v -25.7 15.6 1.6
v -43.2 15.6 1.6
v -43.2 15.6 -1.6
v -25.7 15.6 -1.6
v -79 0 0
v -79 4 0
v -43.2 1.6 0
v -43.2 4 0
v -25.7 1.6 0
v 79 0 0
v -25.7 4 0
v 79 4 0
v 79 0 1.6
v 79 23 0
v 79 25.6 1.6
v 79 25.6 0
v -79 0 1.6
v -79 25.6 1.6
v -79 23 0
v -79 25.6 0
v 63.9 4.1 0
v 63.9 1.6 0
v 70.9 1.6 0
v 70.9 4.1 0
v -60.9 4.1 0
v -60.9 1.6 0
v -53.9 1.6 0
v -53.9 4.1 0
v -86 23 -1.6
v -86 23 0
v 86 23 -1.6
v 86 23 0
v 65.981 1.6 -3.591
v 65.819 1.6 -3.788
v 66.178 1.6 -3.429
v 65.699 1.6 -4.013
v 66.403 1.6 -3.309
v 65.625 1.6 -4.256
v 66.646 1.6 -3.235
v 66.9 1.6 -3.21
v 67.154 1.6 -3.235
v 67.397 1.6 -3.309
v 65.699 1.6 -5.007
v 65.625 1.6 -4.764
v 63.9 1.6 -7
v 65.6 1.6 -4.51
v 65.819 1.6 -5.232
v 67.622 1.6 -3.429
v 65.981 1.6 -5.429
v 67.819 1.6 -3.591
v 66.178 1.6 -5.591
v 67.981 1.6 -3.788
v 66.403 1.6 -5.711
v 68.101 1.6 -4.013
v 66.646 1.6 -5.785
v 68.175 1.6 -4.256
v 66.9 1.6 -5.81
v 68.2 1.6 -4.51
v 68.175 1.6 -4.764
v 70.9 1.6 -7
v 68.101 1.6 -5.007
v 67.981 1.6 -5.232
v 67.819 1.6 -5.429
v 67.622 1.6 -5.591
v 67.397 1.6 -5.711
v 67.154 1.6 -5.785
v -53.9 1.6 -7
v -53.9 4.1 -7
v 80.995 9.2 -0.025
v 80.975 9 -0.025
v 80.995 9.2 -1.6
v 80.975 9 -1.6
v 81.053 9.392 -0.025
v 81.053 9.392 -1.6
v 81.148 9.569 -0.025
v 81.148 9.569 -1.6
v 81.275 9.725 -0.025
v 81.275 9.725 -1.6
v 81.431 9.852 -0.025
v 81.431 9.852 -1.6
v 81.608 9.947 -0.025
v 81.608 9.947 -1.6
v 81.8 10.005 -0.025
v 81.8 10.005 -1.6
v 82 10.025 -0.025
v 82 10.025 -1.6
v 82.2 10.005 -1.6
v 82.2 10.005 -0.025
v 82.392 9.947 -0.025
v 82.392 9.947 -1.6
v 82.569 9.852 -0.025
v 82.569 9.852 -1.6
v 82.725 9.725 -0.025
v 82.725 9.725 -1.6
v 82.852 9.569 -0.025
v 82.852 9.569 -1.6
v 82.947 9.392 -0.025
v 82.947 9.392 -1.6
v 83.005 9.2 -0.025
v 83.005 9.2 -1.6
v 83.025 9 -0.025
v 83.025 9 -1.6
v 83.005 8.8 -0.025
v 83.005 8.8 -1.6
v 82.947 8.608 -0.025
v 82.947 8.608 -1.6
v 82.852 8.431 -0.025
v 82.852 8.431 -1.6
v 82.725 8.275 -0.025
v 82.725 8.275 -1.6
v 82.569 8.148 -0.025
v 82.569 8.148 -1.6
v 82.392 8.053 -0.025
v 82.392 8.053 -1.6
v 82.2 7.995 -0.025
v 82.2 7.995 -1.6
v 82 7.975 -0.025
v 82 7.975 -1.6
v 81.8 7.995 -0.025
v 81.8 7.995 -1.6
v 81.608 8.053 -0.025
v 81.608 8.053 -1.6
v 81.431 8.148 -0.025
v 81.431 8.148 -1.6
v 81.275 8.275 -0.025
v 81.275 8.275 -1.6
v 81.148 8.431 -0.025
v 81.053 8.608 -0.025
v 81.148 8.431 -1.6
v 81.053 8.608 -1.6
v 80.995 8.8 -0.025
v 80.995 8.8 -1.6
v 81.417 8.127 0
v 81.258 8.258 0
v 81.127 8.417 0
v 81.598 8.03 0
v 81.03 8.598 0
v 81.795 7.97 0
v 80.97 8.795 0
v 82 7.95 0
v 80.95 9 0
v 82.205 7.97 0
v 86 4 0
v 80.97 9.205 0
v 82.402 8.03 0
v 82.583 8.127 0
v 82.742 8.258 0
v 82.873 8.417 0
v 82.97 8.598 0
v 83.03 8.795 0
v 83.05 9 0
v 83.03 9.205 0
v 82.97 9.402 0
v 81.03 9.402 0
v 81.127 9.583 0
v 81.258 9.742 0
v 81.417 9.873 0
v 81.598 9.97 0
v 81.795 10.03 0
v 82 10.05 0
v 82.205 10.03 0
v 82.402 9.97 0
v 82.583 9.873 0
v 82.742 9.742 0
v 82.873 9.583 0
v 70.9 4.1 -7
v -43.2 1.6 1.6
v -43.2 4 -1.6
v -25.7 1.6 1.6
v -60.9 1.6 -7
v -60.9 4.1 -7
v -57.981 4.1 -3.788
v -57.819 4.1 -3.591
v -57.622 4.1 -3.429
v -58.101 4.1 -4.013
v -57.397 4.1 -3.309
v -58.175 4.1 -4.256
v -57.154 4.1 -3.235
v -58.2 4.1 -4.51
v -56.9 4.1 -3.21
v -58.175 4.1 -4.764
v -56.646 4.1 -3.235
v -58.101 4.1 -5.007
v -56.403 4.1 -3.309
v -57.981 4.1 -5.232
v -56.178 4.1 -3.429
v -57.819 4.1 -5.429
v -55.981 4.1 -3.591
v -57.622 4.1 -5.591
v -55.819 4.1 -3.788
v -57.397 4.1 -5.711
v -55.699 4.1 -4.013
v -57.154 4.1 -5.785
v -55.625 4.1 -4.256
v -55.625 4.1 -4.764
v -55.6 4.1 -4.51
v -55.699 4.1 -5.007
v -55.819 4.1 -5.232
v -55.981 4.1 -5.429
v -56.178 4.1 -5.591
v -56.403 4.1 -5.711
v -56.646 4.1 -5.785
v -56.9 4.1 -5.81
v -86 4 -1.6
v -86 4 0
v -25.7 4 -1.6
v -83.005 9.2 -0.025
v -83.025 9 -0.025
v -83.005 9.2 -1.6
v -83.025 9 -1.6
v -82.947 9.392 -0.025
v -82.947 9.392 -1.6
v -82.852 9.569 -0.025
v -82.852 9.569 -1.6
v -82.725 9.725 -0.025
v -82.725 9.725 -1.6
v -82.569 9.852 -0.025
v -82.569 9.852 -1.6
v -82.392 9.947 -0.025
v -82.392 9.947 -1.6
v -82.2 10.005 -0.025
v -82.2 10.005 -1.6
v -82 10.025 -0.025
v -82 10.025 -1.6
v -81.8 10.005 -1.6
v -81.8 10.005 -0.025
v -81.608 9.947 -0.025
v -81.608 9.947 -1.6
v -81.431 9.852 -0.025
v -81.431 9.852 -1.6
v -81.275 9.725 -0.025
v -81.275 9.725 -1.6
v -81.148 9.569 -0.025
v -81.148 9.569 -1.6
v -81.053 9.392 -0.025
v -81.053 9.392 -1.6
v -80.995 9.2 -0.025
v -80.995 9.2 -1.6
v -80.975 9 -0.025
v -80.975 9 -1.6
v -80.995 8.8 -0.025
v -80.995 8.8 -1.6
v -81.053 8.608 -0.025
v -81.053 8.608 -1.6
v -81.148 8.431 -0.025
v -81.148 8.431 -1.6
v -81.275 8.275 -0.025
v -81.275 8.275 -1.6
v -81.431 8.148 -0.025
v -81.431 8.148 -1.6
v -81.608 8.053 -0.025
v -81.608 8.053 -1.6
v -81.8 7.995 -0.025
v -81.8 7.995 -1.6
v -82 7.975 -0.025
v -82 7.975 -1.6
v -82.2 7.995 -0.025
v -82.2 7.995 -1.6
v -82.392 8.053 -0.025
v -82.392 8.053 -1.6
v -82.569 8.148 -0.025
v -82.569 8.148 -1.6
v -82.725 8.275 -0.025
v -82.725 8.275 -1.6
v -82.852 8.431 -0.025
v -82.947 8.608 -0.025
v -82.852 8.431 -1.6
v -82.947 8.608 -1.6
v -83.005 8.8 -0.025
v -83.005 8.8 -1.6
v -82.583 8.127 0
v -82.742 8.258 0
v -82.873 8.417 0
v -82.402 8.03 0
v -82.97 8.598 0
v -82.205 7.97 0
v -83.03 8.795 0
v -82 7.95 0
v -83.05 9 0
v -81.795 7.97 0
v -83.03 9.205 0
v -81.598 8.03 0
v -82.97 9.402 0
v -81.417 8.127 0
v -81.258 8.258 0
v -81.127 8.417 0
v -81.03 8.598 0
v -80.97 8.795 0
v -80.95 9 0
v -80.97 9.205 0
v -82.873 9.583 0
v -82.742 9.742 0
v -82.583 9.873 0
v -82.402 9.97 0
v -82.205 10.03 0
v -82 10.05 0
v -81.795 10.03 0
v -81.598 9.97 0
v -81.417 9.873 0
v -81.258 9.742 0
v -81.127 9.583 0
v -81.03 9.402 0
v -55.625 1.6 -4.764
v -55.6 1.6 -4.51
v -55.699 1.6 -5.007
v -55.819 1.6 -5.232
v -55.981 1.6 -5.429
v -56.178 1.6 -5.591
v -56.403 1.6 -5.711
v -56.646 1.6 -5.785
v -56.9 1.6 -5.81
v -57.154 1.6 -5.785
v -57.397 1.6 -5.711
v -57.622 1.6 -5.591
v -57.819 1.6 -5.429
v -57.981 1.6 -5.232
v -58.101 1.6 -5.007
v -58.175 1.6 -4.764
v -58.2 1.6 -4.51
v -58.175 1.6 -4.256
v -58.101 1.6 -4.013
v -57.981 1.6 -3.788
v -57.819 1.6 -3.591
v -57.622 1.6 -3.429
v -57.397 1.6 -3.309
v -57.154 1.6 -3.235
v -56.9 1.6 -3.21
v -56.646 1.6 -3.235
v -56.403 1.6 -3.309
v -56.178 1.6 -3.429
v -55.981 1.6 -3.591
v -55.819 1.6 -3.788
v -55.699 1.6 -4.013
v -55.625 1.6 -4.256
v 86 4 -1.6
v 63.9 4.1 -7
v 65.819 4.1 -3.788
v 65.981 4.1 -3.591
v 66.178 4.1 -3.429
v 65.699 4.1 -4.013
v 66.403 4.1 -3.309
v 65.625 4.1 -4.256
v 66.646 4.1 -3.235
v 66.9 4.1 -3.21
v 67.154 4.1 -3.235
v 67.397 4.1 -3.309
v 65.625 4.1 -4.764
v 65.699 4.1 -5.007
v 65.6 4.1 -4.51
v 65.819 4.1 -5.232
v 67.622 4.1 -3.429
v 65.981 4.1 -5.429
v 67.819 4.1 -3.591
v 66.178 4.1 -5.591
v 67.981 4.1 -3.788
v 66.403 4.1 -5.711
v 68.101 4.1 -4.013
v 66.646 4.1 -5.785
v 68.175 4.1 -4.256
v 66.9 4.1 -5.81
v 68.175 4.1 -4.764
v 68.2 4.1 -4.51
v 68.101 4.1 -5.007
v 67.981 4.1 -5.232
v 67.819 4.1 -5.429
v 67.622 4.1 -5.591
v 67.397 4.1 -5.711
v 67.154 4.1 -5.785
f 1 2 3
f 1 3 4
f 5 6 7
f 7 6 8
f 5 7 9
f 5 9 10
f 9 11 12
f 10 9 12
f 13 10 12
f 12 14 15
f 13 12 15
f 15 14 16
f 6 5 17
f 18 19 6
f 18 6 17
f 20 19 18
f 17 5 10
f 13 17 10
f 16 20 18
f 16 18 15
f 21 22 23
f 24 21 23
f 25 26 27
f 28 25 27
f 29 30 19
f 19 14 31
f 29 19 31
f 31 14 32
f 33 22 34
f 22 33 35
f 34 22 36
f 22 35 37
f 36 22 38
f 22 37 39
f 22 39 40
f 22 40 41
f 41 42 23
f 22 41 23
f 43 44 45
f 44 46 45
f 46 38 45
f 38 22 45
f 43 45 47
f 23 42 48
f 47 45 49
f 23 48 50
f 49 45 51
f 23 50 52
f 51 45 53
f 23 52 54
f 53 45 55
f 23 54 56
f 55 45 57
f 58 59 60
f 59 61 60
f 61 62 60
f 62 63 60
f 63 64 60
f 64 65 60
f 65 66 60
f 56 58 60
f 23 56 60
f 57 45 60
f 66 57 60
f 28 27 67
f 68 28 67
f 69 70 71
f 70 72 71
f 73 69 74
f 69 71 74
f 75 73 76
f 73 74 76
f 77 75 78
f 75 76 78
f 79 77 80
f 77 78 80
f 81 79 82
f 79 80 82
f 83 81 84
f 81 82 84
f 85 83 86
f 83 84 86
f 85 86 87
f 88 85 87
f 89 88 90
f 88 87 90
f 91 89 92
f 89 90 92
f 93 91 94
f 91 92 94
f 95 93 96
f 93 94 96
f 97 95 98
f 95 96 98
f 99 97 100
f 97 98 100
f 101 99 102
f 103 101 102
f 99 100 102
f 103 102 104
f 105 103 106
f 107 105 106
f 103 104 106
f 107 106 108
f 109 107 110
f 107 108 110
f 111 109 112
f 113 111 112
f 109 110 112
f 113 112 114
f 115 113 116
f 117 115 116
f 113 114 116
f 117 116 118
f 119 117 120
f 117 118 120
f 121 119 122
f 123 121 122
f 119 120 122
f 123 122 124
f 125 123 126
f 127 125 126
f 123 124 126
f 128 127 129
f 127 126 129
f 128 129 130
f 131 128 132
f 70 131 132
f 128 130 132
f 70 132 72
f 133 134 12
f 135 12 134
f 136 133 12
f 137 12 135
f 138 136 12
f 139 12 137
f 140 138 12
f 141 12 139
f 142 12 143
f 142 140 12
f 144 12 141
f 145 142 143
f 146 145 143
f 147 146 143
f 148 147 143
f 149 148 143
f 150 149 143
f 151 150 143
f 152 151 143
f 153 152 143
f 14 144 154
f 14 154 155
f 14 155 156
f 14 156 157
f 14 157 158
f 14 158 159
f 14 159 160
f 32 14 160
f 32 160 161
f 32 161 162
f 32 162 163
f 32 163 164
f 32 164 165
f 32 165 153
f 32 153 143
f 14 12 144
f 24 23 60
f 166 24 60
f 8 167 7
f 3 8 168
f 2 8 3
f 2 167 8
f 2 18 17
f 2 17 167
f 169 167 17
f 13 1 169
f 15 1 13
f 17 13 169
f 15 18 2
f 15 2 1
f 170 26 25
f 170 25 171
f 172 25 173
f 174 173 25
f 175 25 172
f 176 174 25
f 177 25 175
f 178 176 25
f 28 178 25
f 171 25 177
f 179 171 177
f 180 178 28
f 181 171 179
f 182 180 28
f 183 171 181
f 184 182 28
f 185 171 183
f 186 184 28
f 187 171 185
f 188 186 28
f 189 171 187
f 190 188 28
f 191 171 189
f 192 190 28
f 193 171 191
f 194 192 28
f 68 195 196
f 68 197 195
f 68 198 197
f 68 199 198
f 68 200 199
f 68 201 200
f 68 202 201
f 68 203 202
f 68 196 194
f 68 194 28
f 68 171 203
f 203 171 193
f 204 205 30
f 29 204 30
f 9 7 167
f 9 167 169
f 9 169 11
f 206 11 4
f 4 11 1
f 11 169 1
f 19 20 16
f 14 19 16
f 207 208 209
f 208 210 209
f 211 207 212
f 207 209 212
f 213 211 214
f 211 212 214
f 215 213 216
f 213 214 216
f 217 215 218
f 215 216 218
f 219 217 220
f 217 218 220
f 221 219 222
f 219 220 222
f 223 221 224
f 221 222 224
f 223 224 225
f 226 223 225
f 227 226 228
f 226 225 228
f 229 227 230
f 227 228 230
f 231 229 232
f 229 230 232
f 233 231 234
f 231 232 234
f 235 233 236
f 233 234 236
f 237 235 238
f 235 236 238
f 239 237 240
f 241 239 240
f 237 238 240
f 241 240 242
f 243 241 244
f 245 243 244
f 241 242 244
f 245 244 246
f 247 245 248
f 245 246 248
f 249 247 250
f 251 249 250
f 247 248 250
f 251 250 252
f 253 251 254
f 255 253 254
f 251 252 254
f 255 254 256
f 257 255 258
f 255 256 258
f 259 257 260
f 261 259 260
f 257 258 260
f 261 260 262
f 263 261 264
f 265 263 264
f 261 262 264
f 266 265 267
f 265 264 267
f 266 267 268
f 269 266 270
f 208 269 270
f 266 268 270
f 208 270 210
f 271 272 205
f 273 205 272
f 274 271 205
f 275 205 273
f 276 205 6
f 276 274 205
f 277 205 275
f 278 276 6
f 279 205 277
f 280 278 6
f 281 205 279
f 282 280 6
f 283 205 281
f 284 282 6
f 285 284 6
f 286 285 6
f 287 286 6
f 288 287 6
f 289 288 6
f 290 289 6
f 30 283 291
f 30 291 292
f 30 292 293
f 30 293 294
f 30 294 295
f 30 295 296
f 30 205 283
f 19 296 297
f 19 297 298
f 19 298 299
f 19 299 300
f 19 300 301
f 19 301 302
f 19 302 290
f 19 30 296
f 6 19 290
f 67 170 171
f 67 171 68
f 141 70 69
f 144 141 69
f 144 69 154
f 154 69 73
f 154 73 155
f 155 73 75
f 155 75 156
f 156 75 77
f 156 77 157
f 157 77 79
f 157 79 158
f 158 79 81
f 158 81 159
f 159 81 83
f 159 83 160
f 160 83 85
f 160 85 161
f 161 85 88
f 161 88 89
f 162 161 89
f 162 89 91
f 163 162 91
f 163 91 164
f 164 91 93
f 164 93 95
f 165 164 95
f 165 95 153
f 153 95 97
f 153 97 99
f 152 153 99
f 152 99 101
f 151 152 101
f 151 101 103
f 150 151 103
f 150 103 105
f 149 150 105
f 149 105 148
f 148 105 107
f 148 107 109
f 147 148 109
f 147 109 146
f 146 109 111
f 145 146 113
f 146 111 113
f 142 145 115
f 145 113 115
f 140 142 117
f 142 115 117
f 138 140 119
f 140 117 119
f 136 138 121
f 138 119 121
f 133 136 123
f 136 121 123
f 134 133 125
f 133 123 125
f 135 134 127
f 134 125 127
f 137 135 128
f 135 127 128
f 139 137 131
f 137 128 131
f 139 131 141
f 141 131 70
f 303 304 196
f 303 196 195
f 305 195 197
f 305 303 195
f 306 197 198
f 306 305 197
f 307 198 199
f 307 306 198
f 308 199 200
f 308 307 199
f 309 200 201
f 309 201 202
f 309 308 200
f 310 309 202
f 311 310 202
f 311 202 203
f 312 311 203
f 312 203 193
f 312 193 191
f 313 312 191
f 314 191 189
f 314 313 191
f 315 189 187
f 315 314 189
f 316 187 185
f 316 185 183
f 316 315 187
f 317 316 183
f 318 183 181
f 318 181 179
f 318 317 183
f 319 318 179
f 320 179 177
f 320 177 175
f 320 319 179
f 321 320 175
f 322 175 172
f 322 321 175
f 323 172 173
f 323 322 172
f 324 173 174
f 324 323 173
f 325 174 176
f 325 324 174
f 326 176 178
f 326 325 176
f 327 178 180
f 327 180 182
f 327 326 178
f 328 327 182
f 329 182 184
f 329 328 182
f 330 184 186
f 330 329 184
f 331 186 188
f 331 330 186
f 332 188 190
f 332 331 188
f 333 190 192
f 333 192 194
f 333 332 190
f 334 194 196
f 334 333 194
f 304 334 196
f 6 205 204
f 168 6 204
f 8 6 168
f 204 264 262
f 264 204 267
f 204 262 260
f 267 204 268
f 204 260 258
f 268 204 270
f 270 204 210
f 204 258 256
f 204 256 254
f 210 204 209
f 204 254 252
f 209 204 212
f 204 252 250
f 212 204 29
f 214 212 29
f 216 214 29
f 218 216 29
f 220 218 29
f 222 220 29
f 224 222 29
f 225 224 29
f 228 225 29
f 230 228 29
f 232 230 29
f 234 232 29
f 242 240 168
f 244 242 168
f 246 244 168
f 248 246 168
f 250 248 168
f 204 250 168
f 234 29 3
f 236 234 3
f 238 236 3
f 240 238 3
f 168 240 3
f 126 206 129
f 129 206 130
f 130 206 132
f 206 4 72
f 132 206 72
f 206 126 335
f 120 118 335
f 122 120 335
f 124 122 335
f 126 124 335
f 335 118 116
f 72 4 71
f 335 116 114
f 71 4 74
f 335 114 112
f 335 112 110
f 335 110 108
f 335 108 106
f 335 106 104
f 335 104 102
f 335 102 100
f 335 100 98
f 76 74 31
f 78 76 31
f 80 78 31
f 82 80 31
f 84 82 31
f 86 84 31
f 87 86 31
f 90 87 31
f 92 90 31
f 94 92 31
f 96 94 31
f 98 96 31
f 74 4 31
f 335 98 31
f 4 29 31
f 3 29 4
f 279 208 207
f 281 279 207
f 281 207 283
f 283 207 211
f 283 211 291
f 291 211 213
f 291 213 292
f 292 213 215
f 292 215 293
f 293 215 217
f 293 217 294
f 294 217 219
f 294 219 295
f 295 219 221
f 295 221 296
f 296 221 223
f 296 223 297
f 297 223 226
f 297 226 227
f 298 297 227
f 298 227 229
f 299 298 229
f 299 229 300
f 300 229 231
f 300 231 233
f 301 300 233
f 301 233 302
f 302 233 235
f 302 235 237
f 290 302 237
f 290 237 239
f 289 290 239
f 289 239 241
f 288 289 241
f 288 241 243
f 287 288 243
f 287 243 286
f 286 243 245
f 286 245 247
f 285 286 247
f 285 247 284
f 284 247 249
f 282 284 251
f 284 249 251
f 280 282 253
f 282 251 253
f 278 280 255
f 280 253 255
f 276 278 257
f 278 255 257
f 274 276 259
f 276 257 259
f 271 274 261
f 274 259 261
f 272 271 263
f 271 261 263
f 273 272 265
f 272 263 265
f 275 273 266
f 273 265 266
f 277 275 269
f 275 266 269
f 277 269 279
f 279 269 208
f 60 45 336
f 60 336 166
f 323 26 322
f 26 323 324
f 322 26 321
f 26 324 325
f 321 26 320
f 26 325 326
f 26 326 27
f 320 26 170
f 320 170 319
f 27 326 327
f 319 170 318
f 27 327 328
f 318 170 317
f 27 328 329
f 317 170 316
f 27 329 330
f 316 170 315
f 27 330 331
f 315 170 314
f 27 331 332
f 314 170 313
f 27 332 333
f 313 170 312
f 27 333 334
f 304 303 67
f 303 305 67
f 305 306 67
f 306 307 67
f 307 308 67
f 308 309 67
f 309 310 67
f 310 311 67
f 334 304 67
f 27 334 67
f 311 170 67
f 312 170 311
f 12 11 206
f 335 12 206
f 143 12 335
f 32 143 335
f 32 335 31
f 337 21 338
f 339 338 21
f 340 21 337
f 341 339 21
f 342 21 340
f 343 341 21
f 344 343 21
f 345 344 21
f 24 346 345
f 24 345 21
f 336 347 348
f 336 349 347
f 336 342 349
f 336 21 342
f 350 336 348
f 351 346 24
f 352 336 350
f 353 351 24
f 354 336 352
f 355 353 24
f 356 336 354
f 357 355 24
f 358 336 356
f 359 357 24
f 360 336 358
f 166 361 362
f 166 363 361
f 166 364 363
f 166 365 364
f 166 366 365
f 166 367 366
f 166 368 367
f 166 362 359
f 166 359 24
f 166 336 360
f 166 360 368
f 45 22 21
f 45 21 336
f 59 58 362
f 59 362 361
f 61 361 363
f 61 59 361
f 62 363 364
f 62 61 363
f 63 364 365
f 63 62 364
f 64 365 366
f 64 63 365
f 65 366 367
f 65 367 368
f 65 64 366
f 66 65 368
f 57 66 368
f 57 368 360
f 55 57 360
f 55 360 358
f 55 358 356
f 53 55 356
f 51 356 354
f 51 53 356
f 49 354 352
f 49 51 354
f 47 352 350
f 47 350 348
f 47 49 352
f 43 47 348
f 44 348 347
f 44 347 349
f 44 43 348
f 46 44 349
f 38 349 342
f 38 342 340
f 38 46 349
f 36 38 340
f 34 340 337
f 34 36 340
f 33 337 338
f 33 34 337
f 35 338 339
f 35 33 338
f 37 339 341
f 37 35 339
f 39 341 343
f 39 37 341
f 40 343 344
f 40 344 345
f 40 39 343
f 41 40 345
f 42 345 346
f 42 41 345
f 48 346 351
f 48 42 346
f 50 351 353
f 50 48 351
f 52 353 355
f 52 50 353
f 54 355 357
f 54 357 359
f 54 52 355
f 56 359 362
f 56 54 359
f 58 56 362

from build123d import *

# Parameters (mm, degrees)
SKETCH1_W                                = 158
SKETCH1_H                                = 25.6
BOSS_EXTRUDE1_DEPTH                      = 1.6
SKETCH2_W                                = 172
SKETCH2_H                                = 19
BOSS_EXTRUDE2_DEPTH                      = 1.6
TAP_DRILL_FOR_M2_5X0_45_TAP3_D           = 2.05
TAP_DRILL_FOR_M2_5X0_45_TAP3_CSINK_D     = 2.1
TAP_DRILL_FOR_M2_5X0_45_TAP3_CSINK_ANGLE = 90
SKETCH7_W                                = 7
SKETCH7_H                                = 7
SKETCH7_R                                = 1.3
BOSS_EXTRUDE3_DEPTH                      = 2.5
BOSS_EXTRUDE3_2_DEPTH                    = 2.5
SKETCH8_W                                = 17.5
SKETCH8_H                                = 14
CUT_EXTRUDE1_DEPTH                       = 2.6
CUT_EXTRUDE1_DEPTH_BACK                  = 8


with BuildPart() as part:
    # Sketch1 → Boss-Extrude1 (new body)
    with BuildSketch(Plane.XY):
        with Locations((0, 12.8)):
            Rectangle(SKETCH1_W, SKETCH1_H)
    extrude(amount=BOSS_EXTRUDE1_DEPTH)

    # Sketch2 → Boss-Extrude2 (add)
    with BuildSketch(Plane.XY):
        with Locations((0, 13.5)):
            Rectangle(SKETCH2_W, SKETCH2_H)
    extrude(amount=-BOSS_EXTRUDE2_DEPTH)

    # Tap Drill for M2.5x0.45 Tap3 (through all)
    with Locations(Plane(origin=(-82, 9, 0), x_dir=(1, 0, 0), z_dir=(0, 0, 1))):
        with Locations((0, 0), (164, 0)):
            CounterSinkHole(TAP_DRILL_FOR_M2_5X0_45_TAP3_D / 2, TAP_DRILL_FOR_M2_5X0_45_TAP3_CSINK_D / 2, counter_sink_angle=TAP_DRILL_FOR_M2_5X0_45_TAP3_CSINK_ANGLE)

    # Sketch8 → Cut-Extrude1 (cut, two sides)
    with BuildSketch(Plane.XY) as cut_extrude1_sk:
        with Locations((-34.45, 8.6)):
            Rectangle(SKETCH8_W, SKETCH8_H)
    extrude(amount=CUT_EXTRUDE1_DEPTH, mode=Mode.SUBTRACT)
    extrude(cut_extrude1_sk.sketch, amount=-CUT_EXTRUDE1_DEPTH_BACK, mode=Mode.SUBTRACT)


with BuildPart() as body_2:
    # Sketch7 → Boss-Extrude3 (new body)
    with BuildSketch(Plane(origin=(0, 1.6, 0), x_dir=(1, 0, 0), z_dir=(0, 1, 0))):
        with Locations((-57.4, 3.5)):
            Rectangle(SKETCH7_W, SKETCH7_H)
        with Locations((-56.9, 4.51)):
            Circle(SKETCH7_R, mode=Mode.SUBTRACT)
    extrude(amount=BOSS_EXTRUDE3_DEPTH)


with BuildPart() as body_3:
    # Sketch7 → Boss-Extrude3 2 (new body)
    with BuildSketch(Plane(origin=(0, 1.6, 0), x_dir=(1, 0, 0), z_dir=(0, 1, 0))):
        with Locations((67.4, 3.5)):
            Rectangle(SKETCH7_W, SKETCH7_H)
        with Locations((66.9, 4.51)):
            Circle(SKETCH7_R, mode=Mode.SUBTRACT)
    extrude(amount=BOSS_EXTRUDE3_2_DEPTH)


solid = Compound([part.part, body_2.part, body_3.part])
